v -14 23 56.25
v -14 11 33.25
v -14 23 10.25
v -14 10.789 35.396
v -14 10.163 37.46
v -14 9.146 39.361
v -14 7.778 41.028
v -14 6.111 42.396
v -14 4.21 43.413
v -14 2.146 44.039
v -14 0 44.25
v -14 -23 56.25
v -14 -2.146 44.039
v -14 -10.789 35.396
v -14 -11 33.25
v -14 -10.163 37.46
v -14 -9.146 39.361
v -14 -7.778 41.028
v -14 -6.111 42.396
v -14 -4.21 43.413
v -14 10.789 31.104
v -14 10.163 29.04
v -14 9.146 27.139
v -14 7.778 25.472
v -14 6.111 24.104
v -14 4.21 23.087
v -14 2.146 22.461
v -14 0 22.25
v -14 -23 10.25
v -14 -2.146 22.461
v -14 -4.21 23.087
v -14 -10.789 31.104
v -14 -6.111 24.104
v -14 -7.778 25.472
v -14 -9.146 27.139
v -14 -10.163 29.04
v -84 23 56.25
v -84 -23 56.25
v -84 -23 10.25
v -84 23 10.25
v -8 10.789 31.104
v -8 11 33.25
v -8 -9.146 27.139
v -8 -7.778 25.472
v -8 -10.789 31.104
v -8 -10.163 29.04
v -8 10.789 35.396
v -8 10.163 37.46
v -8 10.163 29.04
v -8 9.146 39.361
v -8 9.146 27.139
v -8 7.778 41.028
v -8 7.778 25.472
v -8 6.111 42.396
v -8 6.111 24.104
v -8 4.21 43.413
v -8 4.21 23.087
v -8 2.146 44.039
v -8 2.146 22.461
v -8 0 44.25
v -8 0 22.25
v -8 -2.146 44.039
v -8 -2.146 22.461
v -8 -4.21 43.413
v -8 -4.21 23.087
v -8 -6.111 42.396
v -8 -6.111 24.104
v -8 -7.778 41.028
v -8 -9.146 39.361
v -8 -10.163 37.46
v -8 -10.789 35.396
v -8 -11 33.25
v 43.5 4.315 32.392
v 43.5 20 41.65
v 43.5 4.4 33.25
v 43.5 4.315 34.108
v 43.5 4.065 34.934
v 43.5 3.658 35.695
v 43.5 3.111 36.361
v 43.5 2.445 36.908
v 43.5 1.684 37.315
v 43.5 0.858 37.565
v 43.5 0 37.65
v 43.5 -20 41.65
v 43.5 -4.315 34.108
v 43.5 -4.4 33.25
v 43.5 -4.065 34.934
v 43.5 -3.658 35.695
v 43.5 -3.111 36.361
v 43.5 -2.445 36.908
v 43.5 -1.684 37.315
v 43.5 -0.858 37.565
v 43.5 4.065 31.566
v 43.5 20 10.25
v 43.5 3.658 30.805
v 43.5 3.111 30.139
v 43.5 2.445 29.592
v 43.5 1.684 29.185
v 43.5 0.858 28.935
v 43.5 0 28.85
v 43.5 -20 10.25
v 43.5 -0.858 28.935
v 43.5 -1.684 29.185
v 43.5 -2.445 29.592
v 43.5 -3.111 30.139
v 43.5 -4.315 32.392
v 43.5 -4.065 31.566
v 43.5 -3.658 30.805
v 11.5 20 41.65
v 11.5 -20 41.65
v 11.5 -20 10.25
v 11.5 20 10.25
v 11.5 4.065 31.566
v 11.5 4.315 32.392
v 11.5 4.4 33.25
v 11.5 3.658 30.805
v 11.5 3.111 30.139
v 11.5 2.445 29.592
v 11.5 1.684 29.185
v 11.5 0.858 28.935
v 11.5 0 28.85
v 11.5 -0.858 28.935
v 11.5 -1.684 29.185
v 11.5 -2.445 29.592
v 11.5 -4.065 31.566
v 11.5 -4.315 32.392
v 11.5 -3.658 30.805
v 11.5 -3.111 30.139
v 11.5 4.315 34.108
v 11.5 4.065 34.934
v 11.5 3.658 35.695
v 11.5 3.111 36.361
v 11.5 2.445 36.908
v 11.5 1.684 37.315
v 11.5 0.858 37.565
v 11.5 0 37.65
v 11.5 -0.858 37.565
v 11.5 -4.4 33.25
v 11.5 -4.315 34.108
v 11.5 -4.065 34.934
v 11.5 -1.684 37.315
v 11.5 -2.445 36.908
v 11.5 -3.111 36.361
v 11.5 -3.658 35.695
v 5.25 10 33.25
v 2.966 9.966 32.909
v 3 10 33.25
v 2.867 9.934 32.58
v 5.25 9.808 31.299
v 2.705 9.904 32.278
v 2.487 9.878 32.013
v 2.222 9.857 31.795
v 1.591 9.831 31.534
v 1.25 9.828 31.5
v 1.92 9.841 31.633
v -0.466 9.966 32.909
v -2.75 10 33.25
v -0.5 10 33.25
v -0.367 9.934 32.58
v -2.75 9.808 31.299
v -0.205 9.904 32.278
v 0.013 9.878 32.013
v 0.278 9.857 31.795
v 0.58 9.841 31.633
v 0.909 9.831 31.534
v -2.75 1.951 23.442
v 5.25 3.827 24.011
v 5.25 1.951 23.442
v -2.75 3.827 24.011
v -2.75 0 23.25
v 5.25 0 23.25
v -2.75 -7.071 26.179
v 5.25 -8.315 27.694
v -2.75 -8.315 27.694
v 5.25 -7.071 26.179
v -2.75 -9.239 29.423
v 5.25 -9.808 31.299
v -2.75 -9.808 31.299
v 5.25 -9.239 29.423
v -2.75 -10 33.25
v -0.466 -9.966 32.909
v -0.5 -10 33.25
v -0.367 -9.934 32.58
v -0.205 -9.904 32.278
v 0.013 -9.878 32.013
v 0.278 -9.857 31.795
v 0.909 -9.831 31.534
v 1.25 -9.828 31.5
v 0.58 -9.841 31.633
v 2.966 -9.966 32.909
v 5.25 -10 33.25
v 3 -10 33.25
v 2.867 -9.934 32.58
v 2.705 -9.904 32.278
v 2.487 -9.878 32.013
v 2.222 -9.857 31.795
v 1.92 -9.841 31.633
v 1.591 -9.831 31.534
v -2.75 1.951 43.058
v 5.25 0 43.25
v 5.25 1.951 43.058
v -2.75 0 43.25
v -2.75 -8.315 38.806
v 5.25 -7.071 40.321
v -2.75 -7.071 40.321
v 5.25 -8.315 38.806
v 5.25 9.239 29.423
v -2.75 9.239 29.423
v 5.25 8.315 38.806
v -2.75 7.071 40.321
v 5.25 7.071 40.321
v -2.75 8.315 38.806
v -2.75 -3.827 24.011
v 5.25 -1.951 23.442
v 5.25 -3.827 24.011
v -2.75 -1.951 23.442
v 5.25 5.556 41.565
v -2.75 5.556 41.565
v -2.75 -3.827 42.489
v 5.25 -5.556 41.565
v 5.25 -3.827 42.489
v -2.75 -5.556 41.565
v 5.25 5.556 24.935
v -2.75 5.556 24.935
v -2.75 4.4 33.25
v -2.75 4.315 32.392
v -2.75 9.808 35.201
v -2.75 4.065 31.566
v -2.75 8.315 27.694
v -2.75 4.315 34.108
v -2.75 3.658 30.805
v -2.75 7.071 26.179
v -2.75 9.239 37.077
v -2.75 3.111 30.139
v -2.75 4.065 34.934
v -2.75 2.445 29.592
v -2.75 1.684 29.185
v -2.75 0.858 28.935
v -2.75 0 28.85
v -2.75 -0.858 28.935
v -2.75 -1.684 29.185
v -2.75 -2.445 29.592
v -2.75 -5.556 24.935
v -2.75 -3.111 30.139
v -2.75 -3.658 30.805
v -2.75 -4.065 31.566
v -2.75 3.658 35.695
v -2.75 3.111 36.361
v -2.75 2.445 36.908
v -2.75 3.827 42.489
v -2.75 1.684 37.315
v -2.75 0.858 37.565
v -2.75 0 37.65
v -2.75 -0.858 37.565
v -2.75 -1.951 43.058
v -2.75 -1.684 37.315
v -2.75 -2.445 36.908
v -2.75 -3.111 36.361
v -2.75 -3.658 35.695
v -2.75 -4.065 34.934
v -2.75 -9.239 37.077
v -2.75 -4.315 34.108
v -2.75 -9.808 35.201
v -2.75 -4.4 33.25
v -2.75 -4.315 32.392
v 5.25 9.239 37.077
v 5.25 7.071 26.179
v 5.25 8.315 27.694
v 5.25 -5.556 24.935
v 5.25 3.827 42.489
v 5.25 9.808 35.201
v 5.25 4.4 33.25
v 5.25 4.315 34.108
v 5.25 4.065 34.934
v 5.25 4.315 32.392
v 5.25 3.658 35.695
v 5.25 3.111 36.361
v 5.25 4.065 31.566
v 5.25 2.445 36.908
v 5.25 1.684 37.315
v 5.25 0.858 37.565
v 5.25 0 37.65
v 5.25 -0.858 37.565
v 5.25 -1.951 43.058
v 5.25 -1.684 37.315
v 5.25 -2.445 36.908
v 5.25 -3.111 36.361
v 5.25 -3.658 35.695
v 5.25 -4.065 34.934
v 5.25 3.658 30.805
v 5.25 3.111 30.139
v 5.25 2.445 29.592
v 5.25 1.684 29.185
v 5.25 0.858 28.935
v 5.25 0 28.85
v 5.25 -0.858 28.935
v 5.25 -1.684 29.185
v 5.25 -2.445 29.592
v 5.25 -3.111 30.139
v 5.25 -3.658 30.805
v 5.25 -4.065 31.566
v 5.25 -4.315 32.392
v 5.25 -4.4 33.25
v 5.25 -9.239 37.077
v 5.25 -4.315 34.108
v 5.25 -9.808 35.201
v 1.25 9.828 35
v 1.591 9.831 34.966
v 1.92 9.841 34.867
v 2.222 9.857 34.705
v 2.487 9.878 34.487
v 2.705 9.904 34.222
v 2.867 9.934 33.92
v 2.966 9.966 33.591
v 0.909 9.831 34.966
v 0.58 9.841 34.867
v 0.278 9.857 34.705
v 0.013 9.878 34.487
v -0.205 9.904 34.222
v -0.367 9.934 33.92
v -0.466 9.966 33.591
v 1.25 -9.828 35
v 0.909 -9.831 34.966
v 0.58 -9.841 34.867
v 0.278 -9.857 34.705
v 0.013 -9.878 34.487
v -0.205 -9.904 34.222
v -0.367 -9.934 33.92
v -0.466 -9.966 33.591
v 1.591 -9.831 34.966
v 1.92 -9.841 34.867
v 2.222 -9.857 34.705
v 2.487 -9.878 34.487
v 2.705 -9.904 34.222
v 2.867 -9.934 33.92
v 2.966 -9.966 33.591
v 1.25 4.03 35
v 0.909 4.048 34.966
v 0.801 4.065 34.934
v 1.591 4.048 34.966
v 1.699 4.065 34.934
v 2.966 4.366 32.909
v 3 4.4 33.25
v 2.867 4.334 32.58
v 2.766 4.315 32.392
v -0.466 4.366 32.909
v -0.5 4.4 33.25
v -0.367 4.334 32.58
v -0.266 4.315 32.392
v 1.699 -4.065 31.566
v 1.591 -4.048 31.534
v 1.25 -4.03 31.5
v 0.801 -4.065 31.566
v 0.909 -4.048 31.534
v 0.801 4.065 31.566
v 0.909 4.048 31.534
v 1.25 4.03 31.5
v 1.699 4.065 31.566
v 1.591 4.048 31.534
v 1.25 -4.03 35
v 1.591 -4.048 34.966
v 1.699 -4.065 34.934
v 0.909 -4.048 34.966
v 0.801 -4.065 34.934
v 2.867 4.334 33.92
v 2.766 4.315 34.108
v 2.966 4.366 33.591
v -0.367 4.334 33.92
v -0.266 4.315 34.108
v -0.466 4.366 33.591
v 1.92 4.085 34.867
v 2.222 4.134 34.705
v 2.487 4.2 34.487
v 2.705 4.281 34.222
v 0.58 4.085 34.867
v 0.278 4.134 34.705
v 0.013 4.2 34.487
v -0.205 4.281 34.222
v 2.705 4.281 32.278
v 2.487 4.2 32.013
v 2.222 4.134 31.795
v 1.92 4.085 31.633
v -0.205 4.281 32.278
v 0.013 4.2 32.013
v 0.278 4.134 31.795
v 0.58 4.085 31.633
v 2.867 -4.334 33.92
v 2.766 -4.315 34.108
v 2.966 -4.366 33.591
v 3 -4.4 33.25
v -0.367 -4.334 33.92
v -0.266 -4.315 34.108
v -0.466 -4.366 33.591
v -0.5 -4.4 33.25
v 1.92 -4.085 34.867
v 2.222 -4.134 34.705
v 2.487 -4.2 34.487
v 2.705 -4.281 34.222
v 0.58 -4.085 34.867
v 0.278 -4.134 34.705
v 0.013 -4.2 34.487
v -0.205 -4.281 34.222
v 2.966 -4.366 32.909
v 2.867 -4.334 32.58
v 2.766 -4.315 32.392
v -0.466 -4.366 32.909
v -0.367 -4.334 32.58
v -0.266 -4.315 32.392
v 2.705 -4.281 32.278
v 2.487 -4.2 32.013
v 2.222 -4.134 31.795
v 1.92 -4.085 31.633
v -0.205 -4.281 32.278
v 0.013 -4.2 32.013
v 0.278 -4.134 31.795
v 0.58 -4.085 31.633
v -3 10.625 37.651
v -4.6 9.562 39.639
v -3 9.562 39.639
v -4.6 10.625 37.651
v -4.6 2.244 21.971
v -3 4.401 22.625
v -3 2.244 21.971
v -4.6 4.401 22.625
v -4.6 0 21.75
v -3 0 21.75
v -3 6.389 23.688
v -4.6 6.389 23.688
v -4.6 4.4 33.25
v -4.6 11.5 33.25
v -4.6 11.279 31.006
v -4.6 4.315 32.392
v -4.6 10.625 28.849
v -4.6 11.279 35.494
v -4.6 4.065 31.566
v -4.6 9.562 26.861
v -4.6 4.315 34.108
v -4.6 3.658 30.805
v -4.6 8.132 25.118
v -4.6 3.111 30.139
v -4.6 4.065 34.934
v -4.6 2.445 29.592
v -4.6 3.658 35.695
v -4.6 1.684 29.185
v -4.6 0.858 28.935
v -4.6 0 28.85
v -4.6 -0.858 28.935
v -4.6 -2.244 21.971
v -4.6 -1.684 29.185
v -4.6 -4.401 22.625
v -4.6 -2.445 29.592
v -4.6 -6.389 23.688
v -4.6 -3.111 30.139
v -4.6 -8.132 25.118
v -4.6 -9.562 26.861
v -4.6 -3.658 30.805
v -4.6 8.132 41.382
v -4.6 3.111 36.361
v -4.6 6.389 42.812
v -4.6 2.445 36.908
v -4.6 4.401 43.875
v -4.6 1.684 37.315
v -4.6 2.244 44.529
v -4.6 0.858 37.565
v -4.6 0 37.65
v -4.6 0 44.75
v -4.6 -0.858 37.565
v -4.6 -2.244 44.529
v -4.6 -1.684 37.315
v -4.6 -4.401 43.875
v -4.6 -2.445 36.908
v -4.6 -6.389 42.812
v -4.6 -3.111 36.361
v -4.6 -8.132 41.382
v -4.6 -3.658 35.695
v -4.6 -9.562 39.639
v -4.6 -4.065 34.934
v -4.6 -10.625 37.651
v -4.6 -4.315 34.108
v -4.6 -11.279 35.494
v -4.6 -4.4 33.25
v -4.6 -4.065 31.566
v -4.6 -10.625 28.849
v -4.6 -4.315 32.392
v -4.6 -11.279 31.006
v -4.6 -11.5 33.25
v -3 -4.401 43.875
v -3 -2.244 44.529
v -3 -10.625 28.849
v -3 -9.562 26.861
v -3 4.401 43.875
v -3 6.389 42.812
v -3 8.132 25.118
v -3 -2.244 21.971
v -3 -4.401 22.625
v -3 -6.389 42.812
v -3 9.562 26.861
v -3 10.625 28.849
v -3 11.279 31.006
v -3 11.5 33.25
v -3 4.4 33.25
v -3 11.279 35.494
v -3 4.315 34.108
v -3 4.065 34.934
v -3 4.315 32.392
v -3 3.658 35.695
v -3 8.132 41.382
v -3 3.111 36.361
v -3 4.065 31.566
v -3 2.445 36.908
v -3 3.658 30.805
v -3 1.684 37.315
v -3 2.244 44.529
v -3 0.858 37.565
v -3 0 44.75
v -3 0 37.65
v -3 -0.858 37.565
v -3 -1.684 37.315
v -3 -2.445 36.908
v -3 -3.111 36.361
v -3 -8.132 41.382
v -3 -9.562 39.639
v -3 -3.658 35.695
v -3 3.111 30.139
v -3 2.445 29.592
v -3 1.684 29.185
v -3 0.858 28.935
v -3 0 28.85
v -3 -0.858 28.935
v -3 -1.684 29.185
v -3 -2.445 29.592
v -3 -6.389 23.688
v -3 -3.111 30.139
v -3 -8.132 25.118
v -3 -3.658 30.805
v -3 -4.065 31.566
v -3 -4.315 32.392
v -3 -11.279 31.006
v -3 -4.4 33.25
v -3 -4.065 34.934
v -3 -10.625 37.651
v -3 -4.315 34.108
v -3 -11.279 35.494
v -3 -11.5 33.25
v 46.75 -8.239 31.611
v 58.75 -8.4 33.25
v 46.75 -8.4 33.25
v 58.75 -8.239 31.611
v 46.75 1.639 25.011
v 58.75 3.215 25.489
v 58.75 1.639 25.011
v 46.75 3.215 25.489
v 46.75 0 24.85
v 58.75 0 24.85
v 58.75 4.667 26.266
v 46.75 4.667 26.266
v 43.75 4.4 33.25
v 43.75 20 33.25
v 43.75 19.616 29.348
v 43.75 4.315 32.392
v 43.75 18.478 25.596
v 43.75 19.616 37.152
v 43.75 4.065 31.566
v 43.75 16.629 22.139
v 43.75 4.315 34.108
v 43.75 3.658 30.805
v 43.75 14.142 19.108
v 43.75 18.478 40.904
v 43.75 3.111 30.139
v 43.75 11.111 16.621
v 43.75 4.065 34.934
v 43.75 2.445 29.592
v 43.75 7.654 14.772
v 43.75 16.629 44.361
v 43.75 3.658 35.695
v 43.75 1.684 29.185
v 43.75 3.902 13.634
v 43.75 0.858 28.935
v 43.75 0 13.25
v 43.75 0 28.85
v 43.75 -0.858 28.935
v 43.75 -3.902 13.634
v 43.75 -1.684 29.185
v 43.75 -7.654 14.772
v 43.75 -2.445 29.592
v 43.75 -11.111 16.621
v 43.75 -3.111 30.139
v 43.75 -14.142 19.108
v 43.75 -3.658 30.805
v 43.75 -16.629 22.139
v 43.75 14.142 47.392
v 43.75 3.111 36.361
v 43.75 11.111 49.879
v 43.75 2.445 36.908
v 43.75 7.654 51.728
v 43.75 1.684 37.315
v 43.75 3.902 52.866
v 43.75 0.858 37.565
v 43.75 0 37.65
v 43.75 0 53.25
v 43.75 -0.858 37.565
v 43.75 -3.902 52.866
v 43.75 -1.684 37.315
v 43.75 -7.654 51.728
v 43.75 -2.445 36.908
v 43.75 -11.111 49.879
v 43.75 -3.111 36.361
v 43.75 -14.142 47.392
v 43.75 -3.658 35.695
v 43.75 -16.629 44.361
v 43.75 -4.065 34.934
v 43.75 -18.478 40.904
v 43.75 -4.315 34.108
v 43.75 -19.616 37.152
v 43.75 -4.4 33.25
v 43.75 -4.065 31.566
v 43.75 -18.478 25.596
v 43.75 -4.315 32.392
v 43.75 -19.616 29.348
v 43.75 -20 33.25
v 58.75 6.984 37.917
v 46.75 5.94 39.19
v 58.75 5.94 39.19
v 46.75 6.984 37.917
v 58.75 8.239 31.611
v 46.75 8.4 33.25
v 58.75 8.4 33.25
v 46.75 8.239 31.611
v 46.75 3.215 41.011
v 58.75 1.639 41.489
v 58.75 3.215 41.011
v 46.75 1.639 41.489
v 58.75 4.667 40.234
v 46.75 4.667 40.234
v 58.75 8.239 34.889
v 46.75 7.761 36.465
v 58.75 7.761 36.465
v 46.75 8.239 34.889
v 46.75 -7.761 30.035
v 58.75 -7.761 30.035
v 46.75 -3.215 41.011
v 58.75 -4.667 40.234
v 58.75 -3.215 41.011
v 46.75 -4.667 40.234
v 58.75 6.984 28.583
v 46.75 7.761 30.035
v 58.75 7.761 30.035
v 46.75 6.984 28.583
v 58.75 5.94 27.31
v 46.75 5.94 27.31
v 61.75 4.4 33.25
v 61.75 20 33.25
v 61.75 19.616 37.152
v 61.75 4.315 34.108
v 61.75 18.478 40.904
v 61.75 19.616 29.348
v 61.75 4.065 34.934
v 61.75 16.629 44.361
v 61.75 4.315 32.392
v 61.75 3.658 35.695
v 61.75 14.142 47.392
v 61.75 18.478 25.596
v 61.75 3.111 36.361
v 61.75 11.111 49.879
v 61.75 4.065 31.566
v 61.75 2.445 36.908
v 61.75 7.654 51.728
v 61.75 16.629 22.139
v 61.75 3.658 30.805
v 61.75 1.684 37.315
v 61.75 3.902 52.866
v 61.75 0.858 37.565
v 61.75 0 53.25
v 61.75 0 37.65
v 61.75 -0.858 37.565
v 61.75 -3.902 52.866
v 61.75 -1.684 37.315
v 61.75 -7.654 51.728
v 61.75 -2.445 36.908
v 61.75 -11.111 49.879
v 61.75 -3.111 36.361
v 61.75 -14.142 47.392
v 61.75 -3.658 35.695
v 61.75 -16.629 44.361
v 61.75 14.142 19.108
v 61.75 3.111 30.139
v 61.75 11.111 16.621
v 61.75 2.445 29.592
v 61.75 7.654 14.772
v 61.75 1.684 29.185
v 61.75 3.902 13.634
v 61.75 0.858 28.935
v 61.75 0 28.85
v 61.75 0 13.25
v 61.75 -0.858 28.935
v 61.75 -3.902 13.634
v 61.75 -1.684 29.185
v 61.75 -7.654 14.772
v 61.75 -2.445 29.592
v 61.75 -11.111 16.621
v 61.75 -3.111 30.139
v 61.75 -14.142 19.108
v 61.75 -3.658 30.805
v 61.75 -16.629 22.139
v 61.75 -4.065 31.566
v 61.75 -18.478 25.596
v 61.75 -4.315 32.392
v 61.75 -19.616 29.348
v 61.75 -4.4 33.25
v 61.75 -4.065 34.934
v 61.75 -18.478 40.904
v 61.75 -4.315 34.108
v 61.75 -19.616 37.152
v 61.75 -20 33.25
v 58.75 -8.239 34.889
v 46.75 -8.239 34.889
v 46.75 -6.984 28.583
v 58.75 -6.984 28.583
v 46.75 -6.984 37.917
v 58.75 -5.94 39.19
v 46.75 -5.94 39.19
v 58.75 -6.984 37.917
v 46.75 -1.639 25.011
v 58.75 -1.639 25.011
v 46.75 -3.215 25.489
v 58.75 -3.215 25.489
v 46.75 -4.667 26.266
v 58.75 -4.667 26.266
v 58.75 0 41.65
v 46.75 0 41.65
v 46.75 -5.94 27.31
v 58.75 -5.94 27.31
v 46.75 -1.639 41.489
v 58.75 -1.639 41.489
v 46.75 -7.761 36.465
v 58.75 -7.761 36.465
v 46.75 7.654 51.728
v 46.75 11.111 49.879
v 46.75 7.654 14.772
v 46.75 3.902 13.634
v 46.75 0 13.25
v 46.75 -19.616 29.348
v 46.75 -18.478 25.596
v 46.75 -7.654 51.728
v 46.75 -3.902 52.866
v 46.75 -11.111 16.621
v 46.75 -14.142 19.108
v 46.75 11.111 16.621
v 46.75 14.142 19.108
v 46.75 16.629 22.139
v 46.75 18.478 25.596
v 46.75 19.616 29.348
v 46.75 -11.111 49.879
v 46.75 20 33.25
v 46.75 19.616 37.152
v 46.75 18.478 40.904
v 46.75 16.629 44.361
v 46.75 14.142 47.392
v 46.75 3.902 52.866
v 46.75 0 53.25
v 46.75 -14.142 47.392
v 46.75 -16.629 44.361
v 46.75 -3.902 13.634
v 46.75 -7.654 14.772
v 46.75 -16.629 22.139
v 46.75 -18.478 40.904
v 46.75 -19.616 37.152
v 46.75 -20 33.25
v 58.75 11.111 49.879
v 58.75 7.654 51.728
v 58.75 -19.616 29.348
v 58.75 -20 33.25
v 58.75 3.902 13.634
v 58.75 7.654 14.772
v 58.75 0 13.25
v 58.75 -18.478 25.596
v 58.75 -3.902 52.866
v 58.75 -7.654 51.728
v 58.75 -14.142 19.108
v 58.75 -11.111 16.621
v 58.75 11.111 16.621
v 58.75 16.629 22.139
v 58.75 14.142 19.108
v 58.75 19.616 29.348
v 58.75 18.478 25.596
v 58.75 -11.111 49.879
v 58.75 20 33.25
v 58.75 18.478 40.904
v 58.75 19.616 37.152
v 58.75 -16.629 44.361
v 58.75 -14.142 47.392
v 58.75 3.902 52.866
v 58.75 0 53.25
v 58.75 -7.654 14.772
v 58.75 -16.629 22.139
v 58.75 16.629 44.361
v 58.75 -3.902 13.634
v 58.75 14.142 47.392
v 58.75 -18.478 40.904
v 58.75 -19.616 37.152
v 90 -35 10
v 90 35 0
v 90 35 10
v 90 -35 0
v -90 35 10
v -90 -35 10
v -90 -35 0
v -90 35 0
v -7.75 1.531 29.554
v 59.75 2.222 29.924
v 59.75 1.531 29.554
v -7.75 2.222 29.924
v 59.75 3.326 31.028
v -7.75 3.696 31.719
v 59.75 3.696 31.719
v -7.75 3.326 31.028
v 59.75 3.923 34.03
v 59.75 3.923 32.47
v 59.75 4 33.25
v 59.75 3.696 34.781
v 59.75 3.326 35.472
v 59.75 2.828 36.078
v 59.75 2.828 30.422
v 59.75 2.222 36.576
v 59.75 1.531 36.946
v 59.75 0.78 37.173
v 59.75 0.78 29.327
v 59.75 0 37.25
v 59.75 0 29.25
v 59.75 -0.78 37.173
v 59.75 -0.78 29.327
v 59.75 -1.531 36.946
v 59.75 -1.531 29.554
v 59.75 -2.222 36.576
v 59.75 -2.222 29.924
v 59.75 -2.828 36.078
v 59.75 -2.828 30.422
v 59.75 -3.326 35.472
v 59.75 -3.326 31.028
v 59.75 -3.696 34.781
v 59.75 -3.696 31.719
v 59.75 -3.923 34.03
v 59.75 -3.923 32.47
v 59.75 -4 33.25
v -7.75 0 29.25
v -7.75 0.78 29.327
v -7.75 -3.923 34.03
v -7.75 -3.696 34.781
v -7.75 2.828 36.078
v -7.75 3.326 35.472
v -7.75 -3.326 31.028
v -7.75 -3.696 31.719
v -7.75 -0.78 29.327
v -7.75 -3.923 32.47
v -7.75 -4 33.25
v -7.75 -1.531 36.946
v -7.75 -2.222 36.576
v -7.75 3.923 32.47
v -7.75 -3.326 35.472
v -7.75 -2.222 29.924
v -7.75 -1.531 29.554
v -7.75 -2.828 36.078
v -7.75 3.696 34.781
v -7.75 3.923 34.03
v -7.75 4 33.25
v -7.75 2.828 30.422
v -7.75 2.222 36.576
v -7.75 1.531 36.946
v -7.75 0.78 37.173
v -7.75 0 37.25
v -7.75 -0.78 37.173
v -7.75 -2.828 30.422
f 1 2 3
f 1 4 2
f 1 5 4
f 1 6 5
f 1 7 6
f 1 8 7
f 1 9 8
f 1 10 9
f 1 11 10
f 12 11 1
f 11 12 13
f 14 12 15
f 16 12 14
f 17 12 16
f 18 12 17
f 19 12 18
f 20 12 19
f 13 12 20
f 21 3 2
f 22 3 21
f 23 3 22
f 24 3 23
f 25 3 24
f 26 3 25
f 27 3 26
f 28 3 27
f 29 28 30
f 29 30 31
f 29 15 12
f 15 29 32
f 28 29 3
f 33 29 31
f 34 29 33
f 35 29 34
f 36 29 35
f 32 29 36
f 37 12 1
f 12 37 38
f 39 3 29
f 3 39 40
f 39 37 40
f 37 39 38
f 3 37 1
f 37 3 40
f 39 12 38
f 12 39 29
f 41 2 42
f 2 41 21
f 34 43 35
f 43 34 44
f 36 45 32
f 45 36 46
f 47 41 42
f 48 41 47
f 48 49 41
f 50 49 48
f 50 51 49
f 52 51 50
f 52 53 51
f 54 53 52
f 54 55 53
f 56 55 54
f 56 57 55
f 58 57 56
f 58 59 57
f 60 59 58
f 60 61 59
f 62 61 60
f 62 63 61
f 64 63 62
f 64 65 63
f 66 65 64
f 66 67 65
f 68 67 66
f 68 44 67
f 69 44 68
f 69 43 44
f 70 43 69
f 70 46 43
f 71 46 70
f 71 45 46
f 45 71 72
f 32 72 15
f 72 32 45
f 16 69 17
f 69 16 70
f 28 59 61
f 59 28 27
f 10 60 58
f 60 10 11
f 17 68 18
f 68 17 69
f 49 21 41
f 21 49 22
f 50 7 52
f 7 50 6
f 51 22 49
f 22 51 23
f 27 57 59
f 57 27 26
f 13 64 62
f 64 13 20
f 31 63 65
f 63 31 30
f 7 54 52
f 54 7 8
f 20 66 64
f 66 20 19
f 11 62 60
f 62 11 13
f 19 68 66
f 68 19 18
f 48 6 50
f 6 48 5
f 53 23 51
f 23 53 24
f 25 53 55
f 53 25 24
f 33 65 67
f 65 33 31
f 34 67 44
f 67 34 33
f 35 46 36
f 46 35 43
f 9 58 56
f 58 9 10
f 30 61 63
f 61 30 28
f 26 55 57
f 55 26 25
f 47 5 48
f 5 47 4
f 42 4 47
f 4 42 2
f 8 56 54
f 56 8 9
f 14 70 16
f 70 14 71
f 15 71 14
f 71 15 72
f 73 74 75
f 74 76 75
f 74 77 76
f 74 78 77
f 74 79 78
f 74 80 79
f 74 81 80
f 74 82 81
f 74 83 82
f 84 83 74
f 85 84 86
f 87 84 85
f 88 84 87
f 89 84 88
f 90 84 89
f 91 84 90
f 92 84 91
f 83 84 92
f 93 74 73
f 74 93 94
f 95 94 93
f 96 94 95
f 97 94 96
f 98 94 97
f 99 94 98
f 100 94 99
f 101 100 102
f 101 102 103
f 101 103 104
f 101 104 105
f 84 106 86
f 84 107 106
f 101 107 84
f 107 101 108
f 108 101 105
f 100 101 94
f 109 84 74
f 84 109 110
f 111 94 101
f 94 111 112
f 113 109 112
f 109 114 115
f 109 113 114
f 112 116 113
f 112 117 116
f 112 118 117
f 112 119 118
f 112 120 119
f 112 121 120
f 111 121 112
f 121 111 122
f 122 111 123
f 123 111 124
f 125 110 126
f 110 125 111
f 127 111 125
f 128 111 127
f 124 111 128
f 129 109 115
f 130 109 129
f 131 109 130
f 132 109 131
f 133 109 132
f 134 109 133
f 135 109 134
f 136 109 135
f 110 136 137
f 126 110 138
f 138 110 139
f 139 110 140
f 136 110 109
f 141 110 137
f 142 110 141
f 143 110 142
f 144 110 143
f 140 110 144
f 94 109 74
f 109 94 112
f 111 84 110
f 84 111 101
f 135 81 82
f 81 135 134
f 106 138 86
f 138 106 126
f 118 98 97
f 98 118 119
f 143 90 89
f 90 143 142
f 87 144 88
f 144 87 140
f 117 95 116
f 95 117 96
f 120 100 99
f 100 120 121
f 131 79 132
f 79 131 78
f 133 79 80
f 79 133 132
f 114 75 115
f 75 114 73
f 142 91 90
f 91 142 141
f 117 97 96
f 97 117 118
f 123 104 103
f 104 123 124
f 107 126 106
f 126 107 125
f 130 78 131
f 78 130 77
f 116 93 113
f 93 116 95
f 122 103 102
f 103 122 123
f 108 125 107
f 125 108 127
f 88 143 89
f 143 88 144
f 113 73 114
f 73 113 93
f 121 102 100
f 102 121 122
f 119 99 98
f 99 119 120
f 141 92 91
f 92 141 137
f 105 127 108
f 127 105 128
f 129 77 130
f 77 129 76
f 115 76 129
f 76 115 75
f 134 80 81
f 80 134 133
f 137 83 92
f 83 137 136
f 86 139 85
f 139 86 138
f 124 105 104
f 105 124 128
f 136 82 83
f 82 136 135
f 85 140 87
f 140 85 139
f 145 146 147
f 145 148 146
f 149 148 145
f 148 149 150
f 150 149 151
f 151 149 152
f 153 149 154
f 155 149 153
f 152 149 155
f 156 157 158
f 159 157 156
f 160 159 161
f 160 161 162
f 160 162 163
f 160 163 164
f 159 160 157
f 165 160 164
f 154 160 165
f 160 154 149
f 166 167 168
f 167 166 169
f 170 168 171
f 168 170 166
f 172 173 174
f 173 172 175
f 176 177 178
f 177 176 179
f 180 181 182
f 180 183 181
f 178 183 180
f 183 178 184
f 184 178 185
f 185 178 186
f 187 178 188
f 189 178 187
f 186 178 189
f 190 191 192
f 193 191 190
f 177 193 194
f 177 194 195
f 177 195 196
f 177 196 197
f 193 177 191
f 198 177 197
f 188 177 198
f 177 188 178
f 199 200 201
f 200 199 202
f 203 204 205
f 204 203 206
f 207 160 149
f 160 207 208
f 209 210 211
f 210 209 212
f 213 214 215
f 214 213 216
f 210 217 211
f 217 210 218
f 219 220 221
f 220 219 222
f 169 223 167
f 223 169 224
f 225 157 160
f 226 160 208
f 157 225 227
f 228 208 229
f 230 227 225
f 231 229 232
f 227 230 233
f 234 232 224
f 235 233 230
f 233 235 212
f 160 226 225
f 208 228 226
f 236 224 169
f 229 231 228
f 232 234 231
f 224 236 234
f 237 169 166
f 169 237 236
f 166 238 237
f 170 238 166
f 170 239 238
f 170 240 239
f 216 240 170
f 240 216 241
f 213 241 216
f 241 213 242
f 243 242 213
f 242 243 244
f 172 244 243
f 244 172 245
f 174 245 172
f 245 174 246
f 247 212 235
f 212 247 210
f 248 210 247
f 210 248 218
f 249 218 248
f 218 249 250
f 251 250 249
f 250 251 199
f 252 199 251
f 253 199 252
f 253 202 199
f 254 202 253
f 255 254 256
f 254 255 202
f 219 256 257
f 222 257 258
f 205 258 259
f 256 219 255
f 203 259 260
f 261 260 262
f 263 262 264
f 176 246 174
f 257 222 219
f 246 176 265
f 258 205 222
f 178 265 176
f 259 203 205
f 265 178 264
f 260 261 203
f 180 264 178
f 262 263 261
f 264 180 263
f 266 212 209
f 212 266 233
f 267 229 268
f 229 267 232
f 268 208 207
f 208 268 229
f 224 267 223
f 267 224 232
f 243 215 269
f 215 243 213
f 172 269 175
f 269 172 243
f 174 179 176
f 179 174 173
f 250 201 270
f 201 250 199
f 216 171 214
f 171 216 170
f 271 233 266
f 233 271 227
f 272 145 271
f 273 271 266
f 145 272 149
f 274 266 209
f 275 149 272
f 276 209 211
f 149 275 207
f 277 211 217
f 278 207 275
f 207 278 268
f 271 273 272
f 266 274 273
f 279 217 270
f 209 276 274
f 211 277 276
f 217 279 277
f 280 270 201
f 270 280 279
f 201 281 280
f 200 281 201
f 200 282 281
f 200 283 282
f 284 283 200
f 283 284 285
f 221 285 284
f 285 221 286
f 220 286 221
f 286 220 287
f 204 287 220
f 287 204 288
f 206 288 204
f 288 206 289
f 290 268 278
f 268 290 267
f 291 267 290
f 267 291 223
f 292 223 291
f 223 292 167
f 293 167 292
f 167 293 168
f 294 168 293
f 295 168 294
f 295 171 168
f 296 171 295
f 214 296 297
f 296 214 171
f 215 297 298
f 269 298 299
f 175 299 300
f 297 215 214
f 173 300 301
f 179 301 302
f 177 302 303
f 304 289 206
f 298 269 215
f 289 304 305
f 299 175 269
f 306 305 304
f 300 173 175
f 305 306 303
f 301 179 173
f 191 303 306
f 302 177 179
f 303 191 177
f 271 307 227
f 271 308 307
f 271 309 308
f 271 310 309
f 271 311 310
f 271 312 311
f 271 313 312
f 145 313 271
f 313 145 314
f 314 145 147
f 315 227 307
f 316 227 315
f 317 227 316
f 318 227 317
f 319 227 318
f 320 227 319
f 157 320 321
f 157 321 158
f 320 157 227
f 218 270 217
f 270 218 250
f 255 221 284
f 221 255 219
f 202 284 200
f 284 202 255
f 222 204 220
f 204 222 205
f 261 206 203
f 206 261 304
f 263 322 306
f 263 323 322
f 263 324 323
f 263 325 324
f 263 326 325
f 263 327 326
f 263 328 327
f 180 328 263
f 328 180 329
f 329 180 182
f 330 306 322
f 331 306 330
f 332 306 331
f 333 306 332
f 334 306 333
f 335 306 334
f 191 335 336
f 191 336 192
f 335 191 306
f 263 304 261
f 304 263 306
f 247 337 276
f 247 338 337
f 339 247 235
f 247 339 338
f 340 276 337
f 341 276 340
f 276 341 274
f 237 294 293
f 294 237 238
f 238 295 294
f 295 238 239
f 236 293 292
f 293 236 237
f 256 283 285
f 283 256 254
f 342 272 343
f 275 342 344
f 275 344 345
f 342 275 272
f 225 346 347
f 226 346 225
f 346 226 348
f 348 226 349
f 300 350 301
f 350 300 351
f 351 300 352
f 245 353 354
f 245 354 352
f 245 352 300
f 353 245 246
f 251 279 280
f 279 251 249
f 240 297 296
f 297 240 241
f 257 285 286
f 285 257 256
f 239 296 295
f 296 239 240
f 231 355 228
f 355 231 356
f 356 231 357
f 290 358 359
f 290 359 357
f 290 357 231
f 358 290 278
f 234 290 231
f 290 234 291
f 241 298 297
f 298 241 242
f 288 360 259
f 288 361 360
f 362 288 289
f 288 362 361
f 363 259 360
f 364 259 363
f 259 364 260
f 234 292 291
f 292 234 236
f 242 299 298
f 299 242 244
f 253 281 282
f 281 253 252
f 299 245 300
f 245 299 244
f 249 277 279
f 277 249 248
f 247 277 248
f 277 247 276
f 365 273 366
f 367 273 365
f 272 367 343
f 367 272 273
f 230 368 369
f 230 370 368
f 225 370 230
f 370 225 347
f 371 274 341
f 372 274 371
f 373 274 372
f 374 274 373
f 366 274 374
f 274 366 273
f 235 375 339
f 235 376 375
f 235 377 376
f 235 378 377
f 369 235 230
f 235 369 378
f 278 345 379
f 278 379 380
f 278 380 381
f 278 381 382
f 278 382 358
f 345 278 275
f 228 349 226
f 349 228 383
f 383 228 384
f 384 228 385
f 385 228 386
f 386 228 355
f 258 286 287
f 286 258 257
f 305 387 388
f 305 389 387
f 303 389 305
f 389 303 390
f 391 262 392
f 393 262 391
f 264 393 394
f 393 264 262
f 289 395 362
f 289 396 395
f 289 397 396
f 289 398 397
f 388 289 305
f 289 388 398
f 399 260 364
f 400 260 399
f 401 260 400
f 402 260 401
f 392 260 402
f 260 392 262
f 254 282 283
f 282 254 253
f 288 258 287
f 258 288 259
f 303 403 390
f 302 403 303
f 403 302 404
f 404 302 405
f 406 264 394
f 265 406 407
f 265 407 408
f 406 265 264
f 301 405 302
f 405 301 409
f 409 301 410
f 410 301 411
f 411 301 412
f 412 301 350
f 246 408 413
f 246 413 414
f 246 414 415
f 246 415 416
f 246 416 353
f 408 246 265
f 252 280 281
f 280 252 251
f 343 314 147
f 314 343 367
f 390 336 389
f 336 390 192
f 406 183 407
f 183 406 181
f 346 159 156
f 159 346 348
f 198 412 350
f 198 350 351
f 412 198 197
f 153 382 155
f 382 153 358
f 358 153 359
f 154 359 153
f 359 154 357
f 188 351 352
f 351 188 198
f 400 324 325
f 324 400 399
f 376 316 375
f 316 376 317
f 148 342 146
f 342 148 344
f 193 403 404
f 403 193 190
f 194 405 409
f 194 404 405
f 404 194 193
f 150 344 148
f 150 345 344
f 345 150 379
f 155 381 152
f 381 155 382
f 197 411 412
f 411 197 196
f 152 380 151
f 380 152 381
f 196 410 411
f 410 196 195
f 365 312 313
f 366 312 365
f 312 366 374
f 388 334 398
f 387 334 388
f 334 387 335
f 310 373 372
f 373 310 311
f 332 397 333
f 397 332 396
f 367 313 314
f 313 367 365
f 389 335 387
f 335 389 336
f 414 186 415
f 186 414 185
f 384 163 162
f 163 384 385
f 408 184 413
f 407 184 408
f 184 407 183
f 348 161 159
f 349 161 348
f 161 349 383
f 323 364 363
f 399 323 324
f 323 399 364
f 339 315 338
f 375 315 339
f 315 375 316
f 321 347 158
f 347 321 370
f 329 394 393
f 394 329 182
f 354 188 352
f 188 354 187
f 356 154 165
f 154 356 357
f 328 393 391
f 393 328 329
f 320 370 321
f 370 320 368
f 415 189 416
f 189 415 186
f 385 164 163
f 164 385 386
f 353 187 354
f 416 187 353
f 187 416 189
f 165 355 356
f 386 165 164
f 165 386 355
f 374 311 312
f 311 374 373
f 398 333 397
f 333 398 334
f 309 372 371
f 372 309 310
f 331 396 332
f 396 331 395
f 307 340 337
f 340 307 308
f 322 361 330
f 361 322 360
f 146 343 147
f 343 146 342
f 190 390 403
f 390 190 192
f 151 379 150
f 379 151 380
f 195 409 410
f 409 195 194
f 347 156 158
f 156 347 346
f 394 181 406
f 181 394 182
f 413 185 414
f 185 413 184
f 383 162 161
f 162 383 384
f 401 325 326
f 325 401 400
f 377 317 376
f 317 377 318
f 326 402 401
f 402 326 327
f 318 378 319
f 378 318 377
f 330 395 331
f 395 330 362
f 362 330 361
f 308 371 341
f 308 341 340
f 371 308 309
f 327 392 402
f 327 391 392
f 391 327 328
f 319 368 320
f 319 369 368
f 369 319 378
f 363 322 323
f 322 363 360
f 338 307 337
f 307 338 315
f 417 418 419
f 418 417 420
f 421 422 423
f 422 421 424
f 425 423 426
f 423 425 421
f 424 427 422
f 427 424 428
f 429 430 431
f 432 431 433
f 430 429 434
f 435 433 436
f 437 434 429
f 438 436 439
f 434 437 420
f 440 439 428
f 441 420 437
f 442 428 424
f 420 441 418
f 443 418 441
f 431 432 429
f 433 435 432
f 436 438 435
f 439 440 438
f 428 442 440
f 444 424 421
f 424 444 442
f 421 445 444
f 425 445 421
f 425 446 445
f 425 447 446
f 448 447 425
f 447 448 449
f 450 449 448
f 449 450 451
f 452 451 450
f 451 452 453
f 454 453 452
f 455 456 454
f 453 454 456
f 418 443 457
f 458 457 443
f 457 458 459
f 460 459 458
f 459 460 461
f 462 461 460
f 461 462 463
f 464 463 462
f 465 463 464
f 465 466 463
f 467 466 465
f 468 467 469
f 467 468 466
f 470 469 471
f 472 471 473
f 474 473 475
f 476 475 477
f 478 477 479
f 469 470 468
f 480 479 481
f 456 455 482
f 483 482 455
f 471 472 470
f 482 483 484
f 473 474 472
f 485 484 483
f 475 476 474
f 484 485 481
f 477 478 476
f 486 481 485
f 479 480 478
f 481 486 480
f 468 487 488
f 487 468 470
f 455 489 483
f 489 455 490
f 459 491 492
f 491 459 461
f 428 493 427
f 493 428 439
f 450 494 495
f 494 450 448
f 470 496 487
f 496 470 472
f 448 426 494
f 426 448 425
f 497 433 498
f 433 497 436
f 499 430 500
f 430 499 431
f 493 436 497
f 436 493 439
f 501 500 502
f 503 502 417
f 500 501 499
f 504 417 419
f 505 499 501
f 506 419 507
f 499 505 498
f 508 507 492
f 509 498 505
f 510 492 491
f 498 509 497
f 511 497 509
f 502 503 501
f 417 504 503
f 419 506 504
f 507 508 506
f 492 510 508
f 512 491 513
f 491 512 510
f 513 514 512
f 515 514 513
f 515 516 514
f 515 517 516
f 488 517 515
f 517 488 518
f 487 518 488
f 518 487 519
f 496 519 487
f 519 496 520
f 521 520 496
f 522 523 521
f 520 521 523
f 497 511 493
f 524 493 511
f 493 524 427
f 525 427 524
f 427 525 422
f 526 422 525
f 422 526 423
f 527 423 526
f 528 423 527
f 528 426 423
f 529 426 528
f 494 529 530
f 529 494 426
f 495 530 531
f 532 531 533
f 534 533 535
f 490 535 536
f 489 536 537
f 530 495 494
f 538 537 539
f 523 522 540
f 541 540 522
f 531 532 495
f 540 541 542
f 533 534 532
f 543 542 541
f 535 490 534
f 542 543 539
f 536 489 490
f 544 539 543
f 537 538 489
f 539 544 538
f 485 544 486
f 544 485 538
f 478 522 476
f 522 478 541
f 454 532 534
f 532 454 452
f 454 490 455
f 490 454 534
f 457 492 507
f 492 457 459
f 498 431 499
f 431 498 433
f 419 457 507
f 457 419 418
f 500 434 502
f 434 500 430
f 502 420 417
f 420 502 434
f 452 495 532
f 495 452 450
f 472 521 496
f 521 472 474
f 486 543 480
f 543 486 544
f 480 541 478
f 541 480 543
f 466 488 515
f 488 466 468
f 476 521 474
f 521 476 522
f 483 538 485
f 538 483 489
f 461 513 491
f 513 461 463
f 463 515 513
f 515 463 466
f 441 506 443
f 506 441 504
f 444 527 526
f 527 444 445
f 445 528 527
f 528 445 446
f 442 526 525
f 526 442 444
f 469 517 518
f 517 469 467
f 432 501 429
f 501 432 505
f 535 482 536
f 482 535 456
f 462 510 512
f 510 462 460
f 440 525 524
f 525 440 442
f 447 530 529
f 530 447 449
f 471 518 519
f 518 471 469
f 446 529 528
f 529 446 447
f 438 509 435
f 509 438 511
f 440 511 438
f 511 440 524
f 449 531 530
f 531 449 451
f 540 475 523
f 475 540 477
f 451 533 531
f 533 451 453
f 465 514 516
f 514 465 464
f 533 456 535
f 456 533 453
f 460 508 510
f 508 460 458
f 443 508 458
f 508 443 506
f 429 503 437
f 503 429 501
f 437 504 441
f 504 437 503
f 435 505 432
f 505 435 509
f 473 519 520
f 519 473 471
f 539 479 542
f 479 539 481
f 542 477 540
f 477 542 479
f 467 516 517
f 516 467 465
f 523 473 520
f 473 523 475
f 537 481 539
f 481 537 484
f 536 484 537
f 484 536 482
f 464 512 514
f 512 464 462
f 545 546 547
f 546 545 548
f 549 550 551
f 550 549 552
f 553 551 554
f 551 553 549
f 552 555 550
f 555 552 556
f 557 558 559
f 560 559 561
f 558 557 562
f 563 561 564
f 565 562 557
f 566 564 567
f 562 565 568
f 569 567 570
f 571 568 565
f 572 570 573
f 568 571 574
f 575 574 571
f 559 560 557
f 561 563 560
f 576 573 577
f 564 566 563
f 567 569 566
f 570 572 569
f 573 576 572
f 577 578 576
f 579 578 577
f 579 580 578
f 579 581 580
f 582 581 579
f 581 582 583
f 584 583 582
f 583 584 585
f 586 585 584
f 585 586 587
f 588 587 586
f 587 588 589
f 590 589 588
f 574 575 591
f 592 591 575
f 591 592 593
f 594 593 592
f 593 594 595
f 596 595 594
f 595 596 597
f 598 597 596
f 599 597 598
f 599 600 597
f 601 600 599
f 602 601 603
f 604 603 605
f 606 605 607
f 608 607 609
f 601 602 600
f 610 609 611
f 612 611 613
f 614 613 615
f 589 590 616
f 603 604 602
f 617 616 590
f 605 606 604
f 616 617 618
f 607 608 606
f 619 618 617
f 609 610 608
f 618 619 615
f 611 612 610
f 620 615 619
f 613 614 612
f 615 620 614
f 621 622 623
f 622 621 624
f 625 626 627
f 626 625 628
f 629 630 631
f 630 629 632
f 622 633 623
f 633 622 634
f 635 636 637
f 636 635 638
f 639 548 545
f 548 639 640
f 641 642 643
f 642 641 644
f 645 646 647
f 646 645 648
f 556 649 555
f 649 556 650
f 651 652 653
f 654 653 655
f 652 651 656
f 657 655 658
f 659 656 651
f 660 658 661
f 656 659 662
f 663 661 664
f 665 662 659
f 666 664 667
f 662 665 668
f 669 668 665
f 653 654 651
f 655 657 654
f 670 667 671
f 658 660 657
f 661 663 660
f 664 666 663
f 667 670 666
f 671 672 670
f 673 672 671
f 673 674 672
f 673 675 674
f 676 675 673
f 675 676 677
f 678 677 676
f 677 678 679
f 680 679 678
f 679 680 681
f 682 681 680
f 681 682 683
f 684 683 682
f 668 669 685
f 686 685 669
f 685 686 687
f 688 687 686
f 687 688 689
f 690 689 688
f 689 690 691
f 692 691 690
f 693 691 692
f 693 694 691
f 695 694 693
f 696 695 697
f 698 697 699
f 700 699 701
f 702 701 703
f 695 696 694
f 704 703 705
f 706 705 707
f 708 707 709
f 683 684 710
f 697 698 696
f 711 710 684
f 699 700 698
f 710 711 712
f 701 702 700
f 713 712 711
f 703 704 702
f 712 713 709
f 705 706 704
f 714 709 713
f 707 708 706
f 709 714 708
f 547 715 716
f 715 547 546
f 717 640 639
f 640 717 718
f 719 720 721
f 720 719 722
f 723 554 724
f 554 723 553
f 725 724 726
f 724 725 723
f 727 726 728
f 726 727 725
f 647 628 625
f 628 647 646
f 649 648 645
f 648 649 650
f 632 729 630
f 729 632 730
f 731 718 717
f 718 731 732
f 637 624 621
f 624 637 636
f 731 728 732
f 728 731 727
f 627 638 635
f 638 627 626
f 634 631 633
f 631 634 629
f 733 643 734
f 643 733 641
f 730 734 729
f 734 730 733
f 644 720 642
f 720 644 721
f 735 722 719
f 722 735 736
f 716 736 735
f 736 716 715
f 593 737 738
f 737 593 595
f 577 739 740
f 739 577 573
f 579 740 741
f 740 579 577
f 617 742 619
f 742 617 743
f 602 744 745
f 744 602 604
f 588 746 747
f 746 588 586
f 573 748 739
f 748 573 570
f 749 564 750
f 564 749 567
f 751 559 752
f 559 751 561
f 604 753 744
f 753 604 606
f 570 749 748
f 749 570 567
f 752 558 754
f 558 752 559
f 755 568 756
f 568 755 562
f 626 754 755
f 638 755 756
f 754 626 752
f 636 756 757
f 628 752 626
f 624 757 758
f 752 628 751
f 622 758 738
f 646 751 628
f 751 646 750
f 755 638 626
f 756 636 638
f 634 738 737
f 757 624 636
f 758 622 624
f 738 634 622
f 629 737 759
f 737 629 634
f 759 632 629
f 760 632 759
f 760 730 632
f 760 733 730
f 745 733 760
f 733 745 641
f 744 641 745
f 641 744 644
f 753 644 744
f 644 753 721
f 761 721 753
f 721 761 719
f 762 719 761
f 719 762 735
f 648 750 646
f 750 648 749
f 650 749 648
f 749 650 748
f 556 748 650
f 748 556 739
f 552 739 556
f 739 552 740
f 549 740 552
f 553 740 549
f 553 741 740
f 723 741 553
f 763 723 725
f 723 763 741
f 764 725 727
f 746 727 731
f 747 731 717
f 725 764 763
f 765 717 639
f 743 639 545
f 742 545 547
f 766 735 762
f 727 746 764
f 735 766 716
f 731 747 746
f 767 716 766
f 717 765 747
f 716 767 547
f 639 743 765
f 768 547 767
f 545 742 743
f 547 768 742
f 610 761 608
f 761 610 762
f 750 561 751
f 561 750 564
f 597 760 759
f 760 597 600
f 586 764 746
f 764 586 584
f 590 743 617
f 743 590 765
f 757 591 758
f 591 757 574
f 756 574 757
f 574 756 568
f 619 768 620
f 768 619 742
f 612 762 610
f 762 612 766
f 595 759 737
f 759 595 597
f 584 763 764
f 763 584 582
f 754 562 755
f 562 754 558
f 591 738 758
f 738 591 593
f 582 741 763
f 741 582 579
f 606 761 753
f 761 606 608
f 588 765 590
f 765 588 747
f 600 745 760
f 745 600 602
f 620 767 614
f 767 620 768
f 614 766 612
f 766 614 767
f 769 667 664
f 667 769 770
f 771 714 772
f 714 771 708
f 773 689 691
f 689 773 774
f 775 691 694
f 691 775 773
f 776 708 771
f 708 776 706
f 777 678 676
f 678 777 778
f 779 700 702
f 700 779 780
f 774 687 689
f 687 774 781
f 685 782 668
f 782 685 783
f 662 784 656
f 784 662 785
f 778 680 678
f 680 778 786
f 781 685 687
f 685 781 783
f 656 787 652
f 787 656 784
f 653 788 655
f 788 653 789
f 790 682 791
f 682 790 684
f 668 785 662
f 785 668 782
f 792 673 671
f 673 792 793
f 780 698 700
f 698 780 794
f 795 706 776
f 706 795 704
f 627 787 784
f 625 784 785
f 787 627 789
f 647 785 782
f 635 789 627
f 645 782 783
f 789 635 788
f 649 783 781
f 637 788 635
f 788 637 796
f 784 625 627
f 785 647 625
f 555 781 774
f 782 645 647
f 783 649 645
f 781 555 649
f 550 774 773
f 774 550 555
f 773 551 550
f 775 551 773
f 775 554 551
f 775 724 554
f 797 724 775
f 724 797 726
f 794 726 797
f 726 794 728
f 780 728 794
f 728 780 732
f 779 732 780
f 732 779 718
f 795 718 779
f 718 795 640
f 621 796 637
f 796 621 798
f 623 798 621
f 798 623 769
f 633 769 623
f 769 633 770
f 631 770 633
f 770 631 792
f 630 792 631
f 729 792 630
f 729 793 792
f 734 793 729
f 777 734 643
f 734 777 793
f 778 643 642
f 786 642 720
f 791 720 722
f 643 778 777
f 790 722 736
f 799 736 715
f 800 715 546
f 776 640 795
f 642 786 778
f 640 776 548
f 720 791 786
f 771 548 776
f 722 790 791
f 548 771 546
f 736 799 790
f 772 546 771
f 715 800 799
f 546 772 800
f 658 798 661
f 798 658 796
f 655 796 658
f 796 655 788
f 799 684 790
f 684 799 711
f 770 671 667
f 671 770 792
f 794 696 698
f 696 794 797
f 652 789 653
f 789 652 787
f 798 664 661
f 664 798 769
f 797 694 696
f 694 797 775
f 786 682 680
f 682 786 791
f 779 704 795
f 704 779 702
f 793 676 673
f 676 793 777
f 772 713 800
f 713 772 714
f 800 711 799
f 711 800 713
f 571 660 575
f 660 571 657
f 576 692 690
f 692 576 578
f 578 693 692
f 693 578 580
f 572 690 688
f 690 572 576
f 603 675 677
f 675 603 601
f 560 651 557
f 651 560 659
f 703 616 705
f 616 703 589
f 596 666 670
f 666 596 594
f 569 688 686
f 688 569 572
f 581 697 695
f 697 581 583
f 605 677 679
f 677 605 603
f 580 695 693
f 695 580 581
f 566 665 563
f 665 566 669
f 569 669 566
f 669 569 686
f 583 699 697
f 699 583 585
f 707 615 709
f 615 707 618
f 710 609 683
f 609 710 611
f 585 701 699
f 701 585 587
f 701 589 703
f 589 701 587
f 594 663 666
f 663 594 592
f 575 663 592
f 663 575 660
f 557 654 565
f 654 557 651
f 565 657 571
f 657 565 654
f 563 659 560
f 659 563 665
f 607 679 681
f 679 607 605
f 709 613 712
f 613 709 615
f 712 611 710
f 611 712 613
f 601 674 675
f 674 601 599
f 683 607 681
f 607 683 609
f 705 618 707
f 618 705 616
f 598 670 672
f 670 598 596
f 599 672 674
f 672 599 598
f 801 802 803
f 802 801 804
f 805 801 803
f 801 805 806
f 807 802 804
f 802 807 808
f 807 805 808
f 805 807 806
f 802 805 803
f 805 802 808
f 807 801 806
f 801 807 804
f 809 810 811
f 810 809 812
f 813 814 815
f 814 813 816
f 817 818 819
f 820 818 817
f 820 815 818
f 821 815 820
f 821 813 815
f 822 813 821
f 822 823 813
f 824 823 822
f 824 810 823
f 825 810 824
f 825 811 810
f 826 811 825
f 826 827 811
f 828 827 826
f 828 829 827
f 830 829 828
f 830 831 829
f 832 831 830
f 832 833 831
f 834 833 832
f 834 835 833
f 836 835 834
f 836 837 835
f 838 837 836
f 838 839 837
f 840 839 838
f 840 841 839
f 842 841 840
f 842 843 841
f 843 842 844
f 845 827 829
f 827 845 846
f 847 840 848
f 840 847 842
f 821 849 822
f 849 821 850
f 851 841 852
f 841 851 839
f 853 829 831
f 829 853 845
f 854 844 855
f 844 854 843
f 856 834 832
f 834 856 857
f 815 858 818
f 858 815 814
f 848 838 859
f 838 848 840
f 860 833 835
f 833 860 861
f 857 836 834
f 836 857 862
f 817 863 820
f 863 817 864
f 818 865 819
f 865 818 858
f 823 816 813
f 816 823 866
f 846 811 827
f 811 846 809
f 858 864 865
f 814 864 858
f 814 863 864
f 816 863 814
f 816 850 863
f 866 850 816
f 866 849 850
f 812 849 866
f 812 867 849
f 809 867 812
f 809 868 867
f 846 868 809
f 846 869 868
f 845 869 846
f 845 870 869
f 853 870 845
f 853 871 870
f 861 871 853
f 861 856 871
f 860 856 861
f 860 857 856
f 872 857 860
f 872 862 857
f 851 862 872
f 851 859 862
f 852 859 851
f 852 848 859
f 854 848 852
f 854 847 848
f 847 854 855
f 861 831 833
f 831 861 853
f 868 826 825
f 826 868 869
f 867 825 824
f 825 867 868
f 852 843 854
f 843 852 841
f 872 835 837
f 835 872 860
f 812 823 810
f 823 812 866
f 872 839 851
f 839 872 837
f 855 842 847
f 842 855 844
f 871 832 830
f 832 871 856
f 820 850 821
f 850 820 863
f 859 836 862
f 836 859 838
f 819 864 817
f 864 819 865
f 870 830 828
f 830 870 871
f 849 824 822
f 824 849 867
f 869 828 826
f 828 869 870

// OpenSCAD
$fn = 32;

// ------------------------------------------------------------------------
// Motor drive station: motor 70 x 46 mm, shaft d8, pulley d40
// Every part is its own module, assembly() places every instance.
// ------------------------------------------------------------------------

// --- part 1 ---
module station_bed() {
  difference() {
    translate([-90, -35, 0]) cube([180, 70, 10]);
  }
}

// --- part 2 ---
module drive_motor() {
  union() {
    translate([-35, -23, 0]) cube([70, 46, 46]);
    translate([38, 0, 23]) rotate([0, 90, 0]) cylinder(h = 6, d = 22, center = true);
  }
}

// --- part 3 ---
module pillow_block() {
  difference() {
    translate([-16, -20, 0]) cube([32, 40, 31.4]);
    translate([0, 0, 23]) rotate([0, 90, 0]) cylinder(h = 34, d = 8.8, center = true);
  }
}

// --- part 4 ---
module drive_shaft() {
  translate([0, 0, -33.75]) cylinder(h = 67.5, d = 8);
}

// --- part 5 ---
module shaft_collar() {
  difference() {
    cylinder(h = 8, d = 20);
    translate([0, 0, -1]) cylinder(h = 10, d = 8.8);
    translate([0, 0, 4]) rotate([90, 0, 0]) cylinder(h = 22, d = 3.5, center = true);
  }
}

// --- part 6 ---
module collar_washer() {
  difference() {
      translate([0, 0, 0]) cylinder(h = 1.6, d = 23);
      translate([0, 0, -1]) cylinder(h = 3.6, d = 8.8);
    }
}

// --- part 7 ---
module drive_pulley() {
  difference() {
    union() {
      cylinder(h = 18, d = 16.8);
      cylinder(h = 3, d = 40);
      translate([0, 0, 15]) cylinder(h = 3, d = 40);
    }
    translate([0, 0, -1]) cylinder(h = 20, d = 8.8);
  }
}

// --- assembly ---
module assembly() {
  color([0.80, 0.24, 0.20]) translate([0, 0, 0]) rotate([0, 0, 0]) station_bed();
  color([0.20, 0.45, 0.75]) translate([-49, 0, 10.25]) rotate([0, 0, 0]) drive_motor();
  color([0.25, 0.62, 0.32]) translate([27.5, 0, 10.25]) rotate([0, 0, 0]) pillow_block();
  color([0.92, 0.70, 0.18]) translate([26, 0, 33.25]) rotate([0, 90, 0]) drive_shaft();
  color([0.58, 0.35, 0.70]) translate([-2.75, 0, 33.25]) rotate([0, 90, 0]) shaft_collar();
  color([0.16, 0.66, 0.66]) translate([-4.6, 0, 33.25]) rotate([0, 90, 0]) collar_washer();
  color([0.85, 0.48, 0.18]) translate([43.75, 0, 33.25]) rotate([0, 90, 0]) drive_pulley();
}

assembly();
